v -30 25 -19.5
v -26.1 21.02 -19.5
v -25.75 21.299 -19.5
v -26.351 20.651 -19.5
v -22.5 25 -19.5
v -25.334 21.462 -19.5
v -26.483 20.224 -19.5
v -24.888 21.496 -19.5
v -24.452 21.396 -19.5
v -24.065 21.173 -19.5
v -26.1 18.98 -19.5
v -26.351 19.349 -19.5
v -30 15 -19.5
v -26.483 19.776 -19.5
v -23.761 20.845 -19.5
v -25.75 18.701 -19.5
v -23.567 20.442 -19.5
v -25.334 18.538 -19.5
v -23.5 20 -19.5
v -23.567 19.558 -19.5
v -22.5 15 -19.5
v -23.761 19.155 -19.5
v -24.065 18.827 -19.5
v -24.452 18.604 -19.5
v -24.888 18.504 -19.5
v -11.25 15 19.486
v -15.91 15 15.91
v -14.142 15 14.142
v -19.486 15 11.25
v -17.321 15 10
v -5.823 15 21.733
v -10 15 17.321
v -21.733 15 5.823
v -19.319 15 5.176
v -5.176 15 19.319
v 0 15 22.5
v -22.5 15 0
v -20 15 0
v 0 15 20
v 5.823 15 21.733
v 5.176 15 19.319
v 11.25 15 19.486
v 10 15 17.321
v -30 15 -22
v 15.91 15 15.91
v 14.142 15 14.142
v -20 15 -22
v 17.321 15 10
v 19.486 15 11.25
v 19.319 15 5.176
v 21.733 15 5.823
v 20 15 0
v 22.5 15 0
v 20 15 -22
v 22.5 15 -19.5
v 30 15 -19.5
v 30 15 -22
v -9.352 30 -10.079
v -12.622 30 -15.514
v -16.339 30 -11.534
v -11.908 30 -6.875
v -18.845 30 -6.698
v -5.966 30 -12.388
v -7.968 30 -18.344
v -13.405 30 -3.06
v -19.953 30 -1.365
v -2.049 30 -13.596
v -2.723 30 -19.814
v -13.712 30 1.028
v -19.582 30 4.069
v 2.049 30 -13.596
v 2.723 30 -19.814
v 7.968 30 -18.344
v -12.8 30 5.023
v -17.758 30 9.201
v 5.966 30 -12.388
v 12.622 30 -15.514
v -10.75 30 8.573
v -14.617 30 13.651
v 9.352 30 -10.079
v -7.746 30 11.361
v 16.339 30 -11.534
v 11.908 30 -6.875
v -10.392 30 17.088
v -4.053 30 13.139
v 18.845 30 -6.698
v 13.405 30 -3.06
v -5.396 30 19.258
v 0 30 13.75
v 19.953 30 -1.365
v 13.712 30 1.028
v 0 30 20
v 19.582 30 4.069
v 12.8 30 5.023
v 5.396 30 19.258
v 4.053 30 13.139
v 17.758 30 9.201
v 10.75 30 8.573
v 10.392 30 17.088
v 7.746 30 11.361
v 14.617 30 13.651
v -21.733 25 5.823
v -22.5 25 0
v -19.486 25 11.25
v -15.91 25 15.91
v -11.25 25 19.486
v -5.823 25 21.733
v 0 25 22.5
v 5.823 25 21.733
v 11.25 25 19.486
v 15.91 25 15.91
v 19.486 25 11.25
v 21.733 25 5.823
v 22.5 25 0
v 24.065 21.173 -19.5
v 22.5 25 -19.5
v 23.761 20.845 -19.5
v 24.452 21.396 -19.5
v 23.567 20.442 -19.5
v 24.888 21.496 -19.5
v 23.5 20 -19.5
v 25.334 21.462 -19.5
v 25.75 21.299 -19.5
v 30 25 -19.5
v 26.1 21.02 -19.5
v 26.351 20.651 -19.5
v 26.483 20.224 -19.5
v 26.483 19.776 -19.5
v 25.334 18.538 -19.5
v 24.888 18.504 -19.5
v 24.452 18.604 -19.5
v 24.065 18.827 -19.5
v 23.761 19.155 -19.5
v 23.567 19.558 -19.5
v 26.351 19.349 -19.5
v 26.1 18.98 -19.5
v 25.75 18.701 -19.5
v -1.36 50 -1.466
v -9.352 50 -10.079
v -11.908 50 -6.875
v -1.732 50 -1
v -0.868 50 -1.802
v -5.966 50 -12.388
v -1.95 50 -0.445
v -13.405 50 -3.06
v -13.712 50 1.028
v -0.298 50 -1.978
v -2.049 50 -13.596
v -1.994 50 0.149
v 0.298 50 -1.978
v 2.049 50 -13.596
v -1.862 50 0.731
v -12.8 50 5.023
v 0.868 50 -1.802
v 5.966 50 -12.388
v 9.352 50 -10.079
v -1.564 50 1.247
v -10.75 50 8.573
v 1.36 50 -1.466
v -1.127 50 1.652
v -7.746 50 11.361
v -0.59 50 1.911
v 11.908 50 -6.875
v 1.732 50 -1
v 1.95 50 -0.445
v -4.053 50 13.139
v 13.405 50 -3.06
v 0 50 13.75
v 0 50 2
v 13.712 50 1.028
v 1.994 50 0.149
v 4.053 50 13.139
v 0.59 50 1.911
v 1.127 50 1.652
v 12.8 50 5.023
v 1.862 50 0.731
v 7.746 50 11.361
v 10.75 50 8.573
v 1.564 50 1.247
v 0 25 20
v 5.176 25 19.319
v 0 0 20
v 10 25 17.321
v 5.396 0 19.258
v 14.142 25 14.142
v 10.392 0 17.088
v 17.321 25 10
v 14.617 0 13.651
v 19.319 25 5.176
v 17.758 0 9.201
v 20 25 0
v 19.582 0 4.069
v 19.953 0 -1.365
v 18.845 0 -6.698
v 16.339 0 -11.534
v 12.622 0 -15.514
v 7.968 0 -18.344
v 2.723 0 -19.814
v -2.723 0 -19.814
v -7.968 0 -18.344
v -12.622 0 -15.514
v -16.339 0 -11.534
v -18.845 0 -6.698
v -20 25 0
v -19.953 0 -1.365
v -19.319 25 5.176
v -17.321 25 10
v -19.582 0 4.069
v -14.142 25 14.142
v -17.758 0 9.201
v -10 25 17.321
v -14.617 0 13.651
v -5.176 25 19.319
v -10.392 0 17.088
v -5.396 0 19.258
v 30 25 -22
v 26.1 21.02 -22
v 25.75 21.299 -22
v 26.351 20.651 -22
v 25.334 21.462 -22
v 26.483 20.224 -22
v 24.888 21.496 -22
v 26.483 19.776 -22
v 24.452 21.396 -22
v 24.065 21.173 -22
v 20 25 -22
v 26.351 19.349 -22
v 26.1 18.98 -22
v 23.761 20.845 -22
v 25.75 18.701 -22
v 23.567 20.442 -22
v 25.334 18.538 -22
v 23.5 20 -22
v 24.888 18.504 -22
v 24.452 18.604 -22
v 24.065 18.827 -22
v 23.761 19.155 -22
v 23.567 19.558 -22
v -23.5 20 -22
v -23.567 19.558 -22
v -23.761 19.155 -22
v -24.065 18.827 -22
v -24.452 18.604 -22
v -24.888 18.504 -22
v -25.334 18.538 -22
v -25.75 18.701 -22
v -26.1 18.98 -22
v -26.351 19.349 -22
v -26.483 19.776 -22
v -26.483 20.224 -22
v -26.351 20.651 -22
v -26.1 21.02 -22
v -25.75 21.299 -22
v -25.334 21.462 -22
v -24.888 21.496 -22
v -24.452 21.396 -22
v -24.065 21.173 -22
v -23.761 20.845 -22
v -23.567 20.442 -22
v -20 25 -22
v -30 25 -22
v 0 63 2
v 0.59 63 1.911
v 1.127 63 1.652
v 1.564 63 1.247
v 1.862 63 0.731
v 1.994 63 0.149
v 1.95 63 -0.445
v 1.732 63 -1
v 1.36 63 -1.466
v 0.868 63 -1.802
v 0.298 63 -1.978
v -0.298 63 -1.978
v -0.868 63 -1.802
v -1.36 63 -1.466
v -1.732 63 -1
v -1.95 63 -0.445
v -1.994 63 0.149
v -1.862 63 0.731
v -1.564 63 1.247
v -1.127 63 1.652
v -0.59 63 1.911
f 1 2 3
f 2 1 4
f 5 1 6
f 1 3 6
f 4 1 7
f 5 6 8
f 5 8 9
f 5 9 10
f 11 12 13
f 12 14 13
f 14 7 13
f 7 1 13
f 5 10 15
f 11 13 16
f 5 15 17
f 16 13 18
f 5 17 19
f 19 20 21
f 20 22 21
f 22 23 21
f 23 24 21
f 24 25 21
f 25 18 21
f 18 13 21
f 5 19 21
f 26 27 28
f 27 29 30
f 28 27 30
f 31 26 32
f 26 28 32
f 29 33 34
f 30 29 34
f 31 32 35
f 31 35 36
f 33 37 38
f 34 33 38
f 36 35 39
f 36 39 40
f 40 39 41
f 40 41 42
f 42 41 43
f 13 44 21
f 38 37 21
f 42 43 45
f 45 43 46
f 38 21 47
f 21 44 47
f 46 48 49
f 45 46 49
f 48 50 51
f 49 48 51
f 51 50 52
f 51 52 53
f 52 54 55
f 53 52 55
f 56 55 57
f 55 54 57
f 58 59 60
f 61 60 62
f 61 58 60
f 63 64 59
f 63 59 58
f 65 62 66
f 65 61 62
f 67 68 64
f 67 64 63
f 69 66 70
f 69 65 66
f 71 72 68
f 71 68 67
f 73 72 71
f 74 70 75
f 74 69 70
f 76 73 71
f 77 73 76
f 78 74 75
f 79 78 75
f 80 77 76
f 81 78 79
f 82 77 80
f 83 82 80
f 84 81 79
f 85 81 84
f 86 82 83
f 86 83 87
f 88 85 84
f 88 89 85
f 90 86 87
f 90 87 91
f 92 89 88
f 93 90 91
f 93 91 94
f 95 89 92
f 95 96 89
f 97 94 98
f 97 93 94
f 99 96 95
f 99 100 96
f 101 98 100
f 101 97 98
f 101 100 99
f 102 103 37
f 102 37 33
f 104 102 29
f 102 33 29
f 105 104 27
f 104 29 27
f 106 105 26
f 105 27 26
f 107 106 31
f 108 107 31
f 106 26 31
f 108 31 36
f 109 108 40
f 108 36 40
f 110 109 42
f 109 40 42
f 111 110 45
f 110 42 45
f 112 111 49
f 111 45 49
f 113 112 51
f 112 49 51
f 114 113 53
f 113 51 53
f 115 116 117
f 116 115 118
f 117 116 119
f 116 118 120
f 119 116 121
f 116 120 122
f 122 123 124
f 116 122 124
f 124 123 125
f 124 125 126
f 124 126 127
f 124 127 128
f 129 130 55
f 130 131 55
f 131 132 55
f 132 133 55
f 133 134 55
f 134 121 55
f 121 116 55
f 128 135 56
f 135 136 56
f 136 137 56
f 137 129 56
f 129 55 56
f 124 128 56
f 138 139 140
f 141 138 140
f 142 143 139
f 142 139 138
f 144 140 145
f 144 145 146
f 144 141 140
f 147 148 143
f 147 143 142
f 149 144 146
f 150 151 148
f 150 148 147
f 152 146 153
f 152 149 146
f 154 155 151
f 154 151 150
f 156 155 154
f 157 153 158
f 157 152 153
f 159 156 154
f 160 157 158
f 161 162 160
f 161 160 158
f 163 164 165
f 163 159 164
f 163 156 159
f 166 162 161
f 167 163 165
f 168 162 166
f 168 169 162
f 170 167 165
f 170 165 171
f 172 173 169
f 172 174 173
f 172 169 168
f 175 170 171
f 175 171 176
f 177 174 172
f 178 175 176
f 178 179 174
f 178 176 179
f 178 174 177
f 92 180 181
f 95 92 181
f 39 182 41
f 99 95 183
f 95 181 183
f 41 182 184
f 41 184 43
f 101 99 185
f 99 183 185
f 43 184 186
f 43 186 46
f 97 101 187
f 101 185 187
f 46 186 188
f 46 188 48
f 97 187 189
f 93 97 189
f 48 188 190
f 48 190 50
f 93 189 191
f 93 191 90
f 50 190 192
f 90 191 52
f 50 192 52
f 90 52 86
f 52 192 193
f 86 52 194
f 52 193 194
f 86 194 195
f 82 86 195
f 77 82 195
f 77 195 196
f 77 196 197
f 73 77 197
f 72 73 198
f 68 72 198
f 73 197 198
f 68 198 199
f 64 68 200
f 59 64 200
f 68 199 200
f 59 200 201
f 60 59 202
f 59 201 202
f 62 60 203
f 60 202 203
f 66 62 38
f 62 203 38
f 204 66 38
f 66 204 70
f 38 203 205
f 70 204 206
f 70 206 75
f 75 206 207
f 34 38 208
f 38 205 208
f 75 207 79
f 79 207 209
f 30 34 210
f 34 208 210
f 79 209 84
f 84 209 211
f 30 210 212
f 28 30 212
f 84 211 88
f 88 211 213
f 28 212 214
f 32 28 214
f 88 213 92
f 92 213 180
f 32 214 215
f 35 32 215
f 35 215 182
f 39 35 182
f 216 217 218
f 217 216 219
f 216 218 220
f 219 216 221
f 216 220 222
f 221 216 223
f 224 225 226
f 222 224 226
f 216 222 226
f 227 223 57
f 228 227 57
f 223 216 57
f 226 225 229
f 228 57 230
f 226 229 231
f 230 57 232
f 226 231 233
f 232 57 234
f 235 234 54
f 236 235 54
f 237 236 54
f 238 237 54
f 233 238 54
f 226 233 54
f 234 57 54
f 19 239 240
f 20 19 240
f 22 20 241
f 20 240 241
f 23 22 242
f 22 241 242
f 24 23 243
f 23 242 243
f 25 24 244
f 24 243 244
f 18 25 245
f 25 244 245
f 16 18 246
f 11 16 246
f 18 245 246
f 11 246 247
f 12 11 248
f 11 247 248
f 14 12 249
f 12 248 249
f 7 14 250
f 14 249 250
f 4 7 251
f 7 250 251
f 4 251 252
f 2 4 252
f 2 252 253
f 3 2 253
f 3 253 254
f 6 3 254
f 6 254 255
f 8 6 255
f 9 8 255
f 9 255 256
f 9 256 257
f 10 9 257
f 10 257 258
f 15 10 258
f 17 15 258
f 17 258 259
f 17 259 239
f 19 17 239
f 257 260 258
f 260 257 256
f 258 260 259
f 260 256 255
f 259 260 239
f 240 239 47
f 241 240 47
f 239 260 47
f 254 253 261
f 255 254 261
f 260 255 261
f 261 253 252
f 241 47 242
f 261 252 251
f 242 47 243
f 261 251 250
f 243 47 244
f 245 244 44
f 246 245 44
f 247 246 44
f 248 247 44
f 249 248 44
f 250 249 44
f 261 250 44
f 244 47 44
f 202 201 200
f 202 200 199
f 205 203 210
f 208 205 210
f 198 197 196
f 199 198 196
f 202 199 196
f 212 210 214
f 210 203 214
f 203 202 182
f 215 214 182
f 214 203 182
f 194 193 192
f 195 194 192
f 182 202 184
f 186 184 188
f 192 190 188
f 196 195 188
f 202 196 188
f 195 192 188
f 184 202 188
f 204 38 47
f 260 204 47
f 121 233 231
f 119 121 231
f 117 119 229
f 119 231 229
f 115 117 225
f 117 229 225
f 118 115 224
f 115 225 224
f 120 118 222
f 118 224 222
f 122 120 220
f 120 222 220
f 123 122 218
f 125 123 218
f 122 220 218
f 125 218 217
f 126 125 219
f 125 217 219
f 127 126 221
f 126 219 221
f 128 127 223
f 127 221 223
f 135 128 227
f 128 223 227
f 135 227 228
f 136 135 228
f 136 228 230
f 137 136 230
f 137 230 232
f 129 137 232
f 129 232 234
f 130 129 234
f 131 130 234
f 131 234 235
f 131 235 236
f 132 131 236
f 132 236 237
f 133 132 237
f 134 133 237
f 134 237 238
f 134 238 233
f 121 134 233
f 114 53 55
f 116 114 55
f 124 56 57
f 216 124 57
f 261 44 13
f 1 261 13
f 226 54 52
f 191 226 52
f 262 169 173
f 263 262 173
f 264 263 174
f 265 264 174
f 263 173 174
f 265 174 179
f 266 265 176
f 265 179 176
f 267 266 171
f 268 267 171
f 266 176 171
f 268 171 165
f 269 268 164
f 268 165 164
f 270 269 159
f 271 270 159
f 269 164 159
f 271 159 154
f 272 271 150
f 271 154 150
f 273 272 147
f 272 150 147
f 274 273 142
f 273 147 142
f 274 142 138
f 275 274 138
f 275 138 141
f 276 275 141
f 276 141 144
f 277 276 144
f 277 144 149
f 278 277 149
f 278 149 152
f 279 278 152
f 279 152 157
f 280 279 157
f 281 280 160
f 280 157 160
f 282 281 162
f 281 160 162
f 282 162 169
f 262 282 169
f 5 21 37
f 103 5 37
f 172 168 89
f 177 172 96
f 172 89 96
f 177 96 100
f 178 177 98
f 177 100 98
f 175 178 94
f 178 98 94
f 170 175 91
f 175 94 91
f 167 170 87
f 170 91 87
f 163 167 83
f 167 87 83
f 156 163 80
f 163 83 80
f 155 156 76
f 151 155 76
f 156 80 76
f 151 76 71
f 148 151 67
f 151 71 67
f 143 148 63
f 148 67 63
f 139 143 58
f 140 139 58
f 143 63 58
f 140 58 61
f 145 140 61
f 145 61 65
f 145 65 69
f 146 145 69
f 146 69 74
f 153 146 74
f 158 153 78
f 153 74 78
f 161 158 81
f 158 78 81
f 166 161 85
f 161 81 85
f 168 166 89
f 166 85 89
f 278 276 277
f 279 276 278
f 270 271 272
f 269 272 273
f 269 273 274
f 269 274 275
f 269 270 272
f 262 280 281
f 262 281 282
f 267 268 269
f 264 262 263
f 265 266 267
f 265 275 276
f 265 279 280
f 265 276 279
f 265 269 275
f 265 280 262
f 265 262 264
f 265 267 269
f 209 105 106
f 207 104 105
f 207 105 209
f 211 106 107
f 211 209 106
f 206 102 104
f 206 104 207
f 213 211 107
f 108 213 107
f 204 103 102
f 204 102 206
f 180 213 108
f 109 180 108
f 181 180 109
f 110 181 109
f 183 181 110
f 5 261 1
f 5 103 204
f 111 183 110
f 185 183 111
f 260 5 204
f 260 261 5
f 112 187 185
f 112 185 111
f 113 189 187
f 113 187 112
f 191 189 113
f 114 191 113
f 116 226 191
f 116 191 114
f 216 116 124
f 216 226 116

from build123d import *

# Parameters (mm, degrees)
SKETCH1_R           = 20
BOSS_EXTRUDE1_DEPTH = 30
SKETCH2_R           = 13.75
BOSS_EXTRUDE2_DEPTH = 20
SKETCH3_R           = 2
BOSS_EXTRUDE3_DEPTH = 13
EXTRUDE_THIN2_START = -10
EXTRUDE_THIN2_DEPTH = 10
SKETCH6_R           = 1.5
CUT_EXTRUDE1_DEPTH  = 10


with BuildPart() as part:
    # Sketch1 → Boss-Extrude1 (new body)
    with BuildSketch(Plane(origin=(0, 0, 0), x_dir=(1, 0, 0), z_dir=(0, 1, 0))):
        with Locations(Location((0, 0, 0), (0, 0, 270))):
            Circle(SKETCH1_R)
    extrude(amount=BOSS_EXTRUDE1_DEPTH)

    # Sketch2 → Boss-Extrude2 (add)
    with BuildSketch(Plane(origin=(0, 30, 0), x_dir=(1, 0, 0), z_dir=(0, 1, 0))):
        with Locations(Location((0, 0, 0), (0, 0, 270))):
            Circle(SKETCH2_R)
    extrude(amount=BOSS_EXTRUDE2_DEPTH)

    # Sketch3 → Boss-Extrude3 (add)
    with BuildSketch(Plane(origin=(0, 50, 0), x_dir=(1, 0, 0), z_dir=(0, 1, 0))):
        with Locations(Location((0, 0, 0), (0, 0, 270))):
            Circle(SKETCH3_R)
    extrude(amount=BOSS_EXTRUDE3_DEPTH)

    # Sketch4 → Extrude-Thin2 (add)
    with BuildSketch(Plane(origin=(0, 25, 0), x_dir=(1, 0, 0), z_dir=(0, 1, 0)).offset(EXTRUDE_THIN2_START)):
        with BuildLine():
            Line((30, 22), (20, 22))
            Line((20, 22), (20, 0))
            ThreePointArc((20, 0), (0, -20), (-20, 0))
            Line((-20, 0), (-20, 22))
            Line((-20, 22), (-30, 22))
            Line((-30, 22), (-30, 19.5))
            Line((-30, 19.5), (-22.5, 19.5))
            Line((-22.5, 19.5), (-22.5, 0))
            ThreePointArc((-22.5, 0), (0, -22.5), (22.5, 0))
            Line((22.5, 0), (22.5, 19.5))
            Line((22.5, 19.5), (30, 19.5))
            Line((30, 19.5), (30, 22))
        make_face()
    extrude(amount=EXTRUDE_THIN2_DEPTH)

    # Sketch6 → Cut-Extrude1 (cut)
    with BuildSketch(Plane(origin=(0, 0, -22), x_dir=(-1, 0, 0), z_dir=(0, 0, -1))):
        with Locations((-25, 20)):
            Circle(SKETCH6_R)
        with Locations(Location((25, 20, 0), (0, 0, 180))):
            Circle(SKETCH6_R)
    extrude(amount=-CUT_EXTRUDE1_DEPTH, mode=Mode.SUBTRACT)


solid = part.part
